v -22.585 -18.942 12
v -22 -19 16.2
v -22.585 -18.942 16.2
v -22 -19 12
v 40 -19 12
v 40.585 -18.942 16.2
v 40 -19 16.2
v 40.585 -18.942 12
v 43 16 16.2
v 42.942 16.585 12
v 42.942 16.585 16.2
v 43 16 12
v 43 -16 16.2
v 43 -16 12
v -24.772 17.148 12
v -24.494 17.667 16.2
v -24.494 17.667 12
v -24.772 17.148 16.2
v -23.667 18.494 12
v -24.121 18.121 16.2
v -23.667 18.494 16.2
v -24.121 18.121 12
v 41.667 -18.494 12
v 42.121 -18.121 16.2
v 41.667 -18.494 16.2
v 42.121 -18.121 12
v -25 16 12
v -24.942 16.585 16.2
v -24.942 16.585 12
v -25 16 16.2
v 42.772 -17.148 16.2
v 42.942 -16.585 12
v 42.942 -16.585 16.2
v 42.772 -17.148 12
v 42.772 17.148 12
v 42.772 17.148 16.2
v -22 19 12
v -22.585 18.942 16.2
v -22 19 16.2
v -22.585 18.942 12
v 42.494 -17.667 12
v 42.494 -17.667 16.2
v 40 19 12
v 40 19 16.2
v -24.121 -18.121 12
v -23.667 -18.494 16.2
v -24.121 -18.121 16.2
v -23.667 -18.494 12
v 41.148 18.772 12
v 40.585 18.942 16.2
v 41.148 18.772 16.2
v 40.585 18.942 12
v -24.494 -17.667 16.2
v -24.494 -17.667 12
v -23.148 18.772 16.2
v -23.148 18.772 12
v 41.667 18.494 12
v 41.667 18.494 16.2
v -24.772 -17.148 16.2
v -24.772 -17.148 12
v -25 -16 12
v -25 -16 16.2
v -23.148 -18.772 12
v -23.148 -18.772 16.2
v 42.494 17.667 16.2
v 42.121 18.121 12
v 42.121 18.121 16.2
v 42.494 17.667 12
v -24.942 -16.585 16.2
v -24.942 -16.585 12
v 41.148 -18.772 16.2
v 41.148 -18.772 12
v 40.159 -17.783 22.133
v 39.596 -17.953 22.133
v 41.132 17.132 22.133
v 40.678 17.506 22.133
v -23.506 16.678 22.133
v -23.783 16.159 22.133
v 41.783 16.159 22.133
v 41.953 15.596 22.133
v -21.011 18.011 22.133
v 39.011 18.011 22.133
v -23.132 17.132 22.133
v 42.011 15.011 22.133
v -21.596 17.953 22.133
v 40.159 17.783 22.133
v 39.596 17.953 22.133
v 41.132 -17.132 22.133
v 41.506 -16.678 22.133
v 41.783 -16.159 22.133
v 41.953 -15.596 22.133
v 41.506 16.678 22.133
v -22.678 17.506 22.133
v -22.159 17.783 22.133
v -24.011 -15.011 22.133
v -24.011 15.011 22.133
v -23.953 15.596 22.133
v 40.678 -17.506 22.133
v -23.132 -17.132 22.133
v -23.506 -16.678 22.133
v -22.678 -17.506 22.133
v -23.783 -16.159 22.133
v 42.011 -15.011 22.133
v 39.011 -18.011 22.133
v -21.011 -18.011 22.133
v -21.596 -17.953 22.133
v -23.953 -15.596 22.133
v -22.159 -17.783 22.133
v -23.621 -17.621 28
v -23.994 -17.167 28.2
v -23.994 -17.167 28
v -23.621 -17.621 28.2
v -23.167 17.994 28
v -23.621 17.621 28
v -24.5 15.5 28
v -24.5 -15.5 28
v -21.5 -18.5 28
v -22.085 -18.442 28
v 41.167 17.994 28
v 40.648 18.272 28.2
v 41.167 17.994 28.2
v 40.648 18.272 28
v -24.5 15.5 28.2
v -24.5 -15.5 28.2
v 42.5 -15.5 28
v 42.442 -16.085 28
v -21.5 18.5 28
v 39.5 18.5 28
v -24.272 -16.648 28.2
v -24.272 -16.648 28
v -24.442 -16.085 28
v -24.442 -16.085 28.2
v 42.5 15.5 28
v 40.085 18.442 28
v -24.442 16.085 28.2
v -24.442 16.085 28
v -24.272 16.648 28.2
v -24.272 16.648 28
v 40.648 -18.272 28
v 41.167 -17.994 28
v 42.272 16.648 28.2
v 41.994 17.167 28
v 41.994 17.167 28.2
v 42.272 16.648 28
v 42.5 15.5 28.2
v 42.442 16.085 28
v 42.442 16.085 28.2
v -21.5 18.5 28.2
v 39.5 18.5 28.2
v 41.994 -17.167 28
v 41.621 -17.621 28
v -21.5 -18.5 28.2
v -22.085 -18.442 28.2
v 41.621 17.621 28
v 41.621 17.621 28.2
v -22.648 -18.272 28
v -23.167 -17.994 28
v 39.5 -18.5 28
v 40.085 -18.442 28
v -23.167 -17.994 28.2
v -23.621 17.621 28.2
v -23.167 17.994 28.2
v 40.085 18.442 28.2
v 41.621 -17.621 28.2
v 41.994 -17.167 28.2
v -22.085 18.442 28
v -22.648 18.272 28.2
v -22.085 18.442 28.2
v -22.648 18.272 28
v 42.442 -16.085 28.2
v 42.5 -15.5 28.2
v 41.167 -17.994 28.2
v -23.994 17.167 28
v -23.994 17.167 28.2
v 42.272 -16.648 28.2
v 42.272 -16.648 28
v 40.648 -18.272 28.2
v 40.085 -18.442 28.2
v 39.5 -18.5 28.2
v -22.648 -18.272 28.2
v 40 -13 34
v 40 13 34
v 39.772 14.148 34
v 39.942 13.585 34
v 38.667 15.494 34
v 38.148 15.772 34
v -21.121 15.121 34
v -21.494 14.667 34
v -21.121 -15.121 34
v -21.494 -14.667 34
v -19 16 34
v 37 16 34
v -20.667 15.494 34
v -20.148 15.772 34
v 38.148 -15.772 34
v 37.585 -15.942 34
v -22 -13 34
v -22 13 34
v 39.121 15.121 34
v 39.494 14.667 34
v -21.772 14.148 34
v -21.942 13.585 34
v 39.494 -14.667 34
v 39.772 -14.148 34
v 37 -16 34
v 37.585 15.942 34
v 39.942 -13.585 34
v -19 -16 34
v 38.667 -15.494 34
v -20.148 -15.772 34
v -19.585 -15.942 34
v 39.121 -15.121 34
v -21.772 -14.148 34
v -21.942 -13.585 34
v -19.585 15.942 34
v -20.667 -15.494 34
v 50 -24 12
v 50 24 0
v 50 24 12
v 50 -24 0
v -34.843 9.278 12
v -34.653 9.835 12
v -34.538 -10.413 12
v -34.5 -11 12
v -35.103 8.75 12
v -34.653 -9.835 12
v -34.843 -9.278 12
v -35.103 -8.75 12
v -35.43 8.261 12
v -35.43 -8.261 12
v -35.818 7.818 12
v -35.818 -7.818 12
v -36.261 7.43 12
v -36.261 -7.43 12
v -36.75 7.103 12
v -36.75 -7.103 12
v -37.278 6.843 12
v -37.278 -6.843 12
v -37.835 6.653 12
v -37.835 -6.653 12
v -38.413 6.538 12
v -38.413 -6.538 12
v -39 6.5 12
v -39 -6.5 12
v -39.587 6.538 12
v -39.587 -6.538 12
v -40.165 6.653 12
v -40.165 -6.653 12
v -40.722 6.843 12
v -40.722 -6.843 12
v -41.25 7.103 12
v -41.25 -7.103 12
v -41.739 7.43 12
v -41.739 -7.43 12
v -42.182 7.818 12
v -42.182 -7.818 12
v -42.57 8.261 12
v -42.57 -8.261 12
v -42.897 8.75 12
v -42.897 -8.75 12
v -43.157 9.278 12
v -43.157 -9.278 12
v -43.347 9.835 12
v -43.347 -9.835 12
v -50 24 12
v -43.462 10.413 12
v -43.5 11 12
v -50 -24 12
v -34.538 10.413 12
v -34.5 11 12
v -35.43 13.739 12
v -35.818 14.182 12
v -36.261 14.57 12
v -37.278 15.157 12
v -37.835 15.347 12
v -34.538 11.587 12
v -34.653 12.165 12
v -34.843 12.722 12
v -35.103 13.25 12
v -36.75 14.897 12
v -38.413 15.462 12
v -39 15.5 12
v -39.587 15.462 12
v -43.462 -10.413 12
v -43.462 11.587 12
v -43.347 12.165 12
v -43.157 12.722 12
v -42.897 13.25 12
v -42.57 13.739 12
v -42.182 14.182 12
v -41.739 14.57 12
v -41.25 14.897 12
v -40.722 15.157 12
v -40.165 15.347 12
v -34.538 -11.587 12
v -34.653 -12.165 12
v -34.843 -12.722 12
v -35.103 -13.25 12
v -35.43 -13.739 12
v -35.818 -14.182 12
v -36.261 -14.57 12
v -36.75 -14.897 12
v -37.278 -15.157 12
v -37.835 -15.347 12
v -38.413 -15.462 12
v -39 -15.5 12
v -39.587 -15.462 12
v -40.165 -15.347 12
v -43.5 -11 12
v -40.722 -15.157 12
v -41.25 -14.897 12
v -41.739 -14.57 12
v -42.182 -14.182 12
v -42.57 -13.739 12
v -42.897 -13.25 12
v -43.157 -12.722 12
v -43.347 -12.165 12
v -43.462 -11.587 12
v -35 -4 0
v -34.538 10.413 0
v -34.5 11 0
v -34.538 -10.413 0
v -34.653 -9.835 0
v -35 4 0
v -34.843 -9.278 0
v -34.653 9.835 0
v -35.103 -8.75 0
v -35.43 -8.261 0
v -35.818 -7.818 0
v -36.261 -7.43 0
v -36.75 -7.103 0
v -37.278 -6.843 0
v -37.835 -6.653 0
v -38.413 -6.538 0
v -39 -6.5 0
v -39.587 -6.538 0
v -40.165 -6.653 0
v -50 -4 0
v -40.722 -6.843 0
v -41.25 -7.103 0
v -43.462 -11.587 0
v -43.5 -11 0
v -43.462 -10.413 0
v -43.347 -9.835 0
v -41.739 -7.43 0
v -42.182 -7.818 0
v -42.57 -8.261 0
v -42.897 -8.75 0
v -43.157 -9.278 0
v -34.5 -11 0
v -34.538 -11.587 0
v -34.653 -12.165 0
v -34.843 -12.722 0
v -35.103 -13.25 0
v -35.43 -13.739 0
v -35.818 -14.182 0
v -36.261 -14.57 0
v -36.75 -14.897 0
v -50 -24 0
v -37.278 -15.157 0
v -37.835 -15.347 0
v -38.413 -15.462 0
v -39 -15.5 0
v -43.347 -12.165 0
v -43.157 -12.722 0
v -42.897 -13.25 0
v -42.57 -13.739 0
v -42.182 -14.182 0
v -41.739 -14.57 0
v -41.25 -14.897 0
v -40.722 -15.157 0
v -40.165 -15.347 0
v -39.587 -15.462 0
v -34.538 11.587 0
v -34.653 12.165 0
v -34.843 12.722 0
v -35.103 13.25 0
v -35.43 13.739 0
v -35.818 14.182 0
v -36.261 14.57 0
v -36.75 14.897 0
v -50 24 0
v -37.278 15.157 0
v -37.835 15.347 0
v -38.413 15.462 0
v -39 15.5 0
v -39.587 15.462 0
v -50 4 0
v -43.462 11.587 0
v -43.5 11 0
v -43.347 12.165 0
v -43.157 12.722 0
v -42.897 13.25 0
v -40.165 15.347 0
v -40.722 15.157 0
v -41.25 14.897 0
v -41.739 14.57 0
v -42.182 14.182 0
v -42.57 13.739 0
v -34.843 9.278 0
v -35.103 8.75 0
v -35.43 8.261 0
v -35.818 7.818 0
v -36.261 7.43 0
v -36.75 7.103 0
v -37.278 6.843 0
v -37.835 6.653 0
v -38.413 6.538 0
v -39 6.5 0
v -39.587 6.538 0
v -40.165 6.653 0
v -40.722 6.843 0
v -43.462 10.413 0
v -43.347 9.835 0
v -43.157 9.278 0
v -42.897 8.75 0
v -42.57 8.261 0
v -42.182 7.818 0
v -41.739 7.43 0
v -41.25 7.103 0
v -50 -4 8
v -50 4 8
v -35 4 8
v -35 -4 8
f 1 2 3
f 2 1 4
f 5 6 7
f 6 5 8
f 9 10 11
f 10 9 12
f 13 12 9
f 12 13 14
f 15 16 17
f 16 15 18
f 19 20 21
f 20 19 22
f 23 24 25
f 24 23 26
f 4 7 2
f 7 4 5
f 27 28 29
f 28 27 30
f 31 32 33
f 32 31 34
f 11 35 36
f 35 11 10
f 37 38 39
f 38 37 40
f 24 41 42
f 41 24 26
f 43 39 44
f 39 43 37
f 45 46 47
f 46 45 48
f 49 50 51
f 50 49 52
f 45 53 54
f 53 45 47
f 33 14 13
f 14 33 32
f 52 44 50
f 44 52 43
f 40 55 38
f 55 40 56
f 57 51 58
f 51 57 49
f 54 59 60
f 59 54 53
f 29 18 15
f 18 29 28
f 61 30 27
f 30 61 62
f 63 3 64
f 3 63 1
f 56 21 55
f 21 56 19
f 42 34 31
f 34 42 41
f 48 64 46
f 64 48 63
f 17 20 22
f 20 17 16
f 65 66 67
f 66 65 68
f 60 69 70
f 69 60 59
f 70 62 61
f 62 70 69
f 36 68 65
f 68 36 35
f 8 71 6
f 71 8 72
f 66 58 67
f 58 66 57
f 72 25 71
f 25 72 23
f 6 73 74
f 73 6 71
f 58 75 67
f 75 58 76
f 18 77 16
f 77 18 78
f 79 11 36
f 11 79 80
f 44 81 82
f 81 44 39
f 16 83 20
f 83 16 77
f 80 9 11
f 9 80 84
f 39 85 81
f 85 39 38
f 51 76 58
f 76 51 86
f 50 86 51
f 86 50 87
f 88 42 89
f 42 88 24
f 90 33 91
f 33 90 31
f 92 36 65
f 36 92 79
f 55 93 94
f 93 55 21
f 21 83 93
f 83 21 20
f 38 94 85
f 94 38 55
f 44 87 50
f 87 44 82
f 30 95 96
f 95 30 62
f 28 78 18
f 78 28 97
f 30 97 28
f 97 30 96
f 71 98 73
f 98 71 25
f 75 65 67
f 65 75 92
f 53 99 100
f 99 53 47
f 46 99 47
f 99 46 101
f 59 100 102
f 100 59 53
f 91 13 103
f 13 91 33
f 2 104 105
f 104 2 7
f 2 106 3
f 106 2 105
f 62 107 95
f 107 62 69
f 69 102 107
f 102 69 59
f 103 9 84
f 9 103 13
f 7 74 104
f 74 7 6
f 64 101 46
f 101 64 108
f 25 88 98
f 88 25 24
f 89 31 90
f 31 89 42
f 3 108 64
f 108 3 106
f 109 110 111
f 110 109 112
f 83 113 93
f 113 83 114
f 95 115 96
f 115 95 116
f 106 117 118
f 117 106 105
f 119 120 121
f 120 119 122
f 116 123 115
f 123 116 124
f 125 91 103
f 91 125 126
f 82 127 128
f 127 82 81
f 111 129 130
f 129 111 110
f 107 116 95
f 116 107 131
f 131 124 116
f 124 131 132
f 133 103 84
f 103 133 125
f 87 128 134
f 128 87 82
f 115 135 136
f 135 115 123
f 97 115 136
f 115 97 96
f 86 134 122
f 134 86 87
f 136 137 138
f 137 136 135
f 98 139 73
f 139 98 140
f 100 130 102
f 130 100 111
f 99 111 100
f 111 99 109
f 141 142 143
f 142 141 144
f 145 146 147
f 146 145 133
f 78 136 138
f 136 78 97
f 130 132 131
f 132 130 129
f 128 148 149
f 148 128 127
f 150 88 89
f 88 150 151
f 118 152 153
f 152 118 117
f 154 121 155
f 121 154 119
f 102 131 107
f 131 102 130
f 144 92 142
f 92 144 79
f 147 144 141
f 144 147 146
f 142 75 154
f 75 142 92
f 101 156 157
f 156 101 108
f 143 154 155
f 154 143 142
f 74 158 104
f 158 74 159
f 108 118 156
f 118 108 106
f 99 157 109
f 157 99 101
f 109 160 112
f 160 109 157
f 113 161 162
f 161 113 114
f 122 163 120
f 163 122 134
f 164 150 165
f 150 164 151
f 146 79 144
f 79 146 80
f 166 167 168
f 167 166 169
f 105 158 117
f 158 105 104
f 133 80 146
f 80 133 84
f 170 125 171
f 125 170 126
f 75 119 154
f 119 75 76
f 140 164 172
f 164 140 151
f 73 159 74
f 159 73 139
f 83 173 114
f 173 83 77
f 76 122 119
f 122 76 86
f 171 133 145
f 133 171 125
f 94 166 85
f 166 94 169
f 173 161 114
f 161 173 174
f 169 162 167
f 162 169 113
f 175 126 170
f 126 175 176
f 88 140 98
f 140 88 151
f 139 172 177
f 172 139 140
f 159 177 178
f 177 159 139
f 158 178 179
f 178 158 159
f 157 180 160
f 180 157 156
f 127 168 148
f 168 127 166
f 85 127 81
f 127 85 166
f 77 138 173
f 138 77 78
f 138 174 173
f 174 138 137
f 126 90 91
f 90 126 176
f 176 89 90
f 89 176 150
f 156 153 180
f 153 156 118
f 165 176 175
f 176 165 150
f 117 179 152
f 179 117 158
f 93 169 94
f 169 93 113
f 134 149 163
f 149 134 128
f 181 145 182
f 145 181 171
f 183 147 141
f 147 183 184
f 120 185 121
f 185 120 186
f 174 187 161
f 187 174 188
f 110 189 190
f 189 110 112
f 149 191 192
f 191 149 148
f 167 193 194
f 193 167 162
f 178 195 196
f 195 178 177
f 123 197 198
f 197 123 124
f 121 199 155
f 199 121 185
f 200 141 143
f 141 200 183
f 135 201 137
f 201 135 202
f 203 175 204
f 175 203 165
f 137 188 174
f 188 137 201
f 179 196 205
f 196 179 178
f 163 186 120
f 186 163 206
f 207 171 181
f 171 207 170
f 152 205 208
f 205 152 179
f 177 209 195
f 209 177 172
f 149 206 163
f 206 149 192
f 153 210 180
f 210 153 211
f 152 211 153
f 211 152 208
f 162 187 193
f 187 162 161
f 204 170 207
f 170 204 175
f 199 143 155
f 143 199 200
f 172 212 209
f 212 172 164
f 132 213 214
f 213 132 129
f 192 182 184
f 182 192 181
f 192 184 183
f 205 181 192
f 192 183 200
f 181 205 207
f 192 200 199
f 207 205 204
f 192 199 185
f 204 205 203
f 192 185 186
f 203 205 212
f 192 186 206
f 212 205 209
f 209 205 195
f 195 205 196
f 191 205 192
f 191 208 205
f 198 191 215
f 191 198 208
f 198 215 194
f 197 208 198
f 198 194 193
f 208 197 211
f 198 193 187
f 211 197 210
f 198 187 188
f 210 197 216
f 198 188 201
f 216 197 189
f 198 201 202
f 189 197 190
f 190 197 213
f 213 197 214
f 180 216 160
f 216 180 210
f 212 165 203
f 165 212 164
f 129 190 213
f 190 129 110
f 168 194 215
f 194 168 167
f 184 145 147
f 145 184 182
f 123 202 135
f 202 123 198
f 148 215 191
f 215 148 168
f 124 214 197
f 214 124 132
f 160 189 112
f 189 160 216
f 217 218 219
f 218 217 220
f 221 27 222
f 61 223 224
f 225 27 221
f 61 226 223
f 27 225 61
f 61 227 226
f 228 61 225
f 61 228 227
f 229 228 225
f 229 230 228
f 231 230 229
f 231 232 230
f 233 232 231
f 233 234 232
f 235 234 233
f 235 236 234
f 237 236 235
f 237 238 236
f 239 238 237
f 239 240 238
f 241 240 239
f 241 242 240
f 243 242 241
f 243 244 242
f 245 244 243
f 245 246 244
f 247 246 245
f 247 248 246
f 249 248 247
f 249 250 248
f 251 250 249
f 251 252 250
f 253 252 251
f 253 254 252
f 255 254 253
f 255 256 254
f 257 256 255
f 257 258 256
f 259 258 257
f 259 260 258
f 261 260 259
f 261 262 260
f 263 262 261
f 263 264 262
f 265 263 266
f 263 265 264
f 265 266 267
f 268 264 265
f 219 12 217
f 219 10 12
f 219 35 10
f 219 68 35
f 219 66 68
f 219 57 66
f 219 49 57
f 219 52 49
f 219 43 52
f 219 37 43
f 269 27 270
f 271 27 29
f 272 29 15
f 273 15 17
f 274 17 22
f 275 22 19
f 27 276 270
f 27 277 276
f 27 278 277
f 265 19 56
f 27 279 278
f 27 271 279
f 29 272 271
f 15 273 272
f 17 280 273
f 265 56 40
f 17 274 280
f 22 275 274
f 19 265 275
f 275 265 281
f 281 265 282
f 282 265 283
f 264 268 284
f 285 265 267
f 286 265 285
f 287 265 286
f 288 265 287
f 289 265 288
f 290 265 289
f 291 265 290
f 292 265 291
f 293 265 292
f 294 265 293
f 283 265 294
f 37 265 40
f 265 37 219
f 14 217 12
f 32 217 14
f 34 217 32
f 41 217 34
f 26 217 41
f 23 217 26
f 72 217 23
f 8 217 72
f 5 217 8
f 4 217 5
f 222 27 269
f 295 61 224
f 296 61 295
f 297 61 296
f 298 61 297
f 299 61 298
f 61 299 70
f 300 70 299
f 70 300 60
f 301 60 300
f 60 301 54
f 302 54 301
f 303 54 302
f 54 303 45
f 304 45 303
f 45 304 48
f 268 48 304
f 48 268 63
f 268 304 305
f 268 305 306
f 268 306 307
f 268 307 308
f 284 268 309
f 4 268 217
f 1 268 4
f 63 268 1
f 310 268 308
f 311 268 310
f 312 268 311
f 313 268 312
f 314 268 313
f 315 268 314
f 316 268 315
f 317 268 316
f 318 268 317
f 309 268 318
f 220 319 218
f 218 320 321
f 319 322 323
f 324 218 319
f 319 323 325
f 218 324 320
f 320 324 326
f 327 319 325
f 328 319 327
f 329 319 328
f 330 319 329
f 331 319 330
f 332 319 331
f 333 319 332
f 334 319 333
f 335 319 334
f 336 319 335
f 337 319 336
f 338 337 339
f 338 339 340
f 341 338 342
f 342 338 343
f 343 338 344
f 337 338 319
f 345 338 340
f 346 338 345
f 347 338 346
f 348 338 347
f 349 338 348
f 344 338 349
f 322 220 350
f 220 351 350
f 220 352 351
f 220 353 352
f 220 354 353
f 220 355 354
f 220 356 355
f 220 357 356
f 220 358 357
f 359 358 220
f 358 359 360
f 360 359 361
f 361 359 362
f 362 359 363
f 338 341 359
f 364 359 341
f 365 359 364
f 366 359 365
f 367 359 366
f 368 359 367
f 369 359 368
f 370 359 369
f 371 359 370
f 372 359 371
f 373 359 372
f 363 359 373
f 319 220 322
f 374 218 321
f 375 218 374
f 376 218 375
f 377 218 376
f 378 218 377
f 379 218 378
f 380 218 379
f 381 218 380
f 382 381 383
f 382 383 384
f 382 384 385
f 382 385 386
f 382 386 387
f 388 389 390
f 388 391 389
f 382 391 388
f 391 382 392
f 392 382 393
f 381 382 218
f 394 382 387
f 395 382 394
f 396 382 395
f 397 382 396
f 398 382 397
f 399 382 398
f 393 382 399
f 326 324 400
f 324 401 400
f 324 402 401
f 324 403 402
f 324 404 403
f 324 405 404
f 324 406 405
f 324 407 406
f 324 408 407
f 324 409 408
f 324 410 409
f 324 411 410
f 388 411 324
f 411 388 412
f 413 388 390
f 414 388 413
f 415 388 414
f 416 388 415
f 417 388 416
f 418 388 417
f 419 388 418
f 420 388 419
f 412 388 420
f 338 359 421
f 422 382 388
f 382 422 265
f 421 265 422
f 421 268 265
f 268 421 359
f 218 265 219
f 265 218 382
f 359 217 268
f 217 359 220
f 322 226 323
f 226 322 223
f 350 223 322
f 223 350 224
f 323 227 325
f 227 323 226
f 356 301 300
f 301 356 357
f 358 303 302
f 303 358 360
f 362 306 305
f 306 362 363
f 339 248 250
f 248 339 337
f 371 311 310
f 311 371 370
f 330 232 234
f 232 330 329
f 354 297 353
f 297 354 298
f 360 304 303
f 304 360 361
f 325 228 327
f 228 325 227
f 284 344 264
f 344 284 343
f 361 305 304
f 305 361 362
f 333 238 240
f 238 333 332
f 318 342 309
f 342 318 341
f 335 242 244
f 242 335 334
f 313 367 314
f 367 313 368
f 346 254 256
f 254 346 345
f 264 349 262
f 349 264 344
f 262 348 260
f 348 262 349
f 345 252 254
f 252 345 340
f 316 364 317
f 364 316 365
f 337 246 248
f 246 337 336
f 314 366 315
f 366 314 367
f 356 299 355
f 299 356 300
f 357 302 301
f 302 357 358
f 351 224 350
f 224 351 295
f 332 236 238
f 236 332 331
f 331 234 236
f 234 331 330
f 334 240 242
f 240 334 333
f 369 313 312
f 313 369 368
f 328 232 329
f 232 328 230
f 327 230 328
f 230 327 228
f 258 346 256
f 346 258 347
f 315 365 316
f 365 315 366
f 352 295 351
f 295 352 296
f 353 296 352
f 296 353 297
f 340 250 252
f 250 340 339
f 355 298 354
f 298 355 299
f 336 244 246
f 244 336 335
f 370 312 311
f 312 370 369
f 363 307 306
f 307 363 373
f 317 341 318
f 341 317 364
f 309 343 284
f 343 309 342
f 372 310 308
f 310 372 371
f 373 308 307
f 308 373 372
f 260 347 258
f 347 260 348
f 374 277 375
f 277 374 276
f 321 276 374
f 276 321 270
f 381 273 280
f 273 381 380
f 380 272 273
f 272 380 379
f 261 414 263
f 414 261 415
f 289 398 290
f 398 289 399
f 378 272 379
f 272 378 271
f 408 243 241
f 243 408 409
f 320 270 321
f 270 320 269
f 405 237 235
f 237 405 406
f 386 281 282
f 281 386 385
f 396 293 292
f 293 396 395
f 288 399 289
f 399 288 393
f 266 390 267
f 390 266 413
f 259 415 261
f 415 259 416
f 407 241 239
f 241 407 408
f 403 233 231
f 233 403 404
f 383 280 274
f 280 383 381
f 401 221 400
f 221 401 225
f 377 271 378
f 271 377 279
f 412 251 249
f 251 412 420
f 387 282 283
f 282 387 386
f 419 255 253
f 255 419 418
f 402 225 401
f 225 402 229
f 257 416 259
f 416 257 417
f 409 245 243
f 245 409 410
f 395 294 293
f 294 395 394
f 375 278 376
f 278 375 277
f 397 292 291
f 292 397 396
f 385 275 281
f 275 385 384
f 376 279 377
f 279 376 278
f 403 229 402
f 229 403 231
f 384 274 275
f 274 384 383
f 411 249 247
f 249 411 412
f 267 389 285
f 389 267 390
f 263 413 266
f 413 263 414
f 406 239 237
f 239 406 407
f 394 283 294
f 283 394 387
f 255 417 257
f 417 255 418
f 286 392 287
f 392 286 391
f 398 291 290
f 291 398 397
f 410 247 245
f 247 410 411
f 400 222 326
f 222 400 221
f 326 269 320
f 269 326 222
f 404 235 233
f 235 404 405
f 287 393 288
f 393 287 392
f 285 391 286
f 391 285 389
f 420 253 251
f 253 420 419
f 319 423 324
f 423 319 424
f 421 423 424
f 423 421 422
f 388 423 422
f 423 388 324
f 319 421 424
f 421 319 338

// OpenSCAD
// Editable exterior of the sample part. Units are millimetres.
outer_rounding = 3;
side_bend = 1;
top_taper = 3;

mount_height = 12;
body_height = 34;

module mount_solid() {
    translate([-50, -24, 0]) cube([100, 48, mount_height]);
}

module mating_voids() {
    for (y = [-11, 11])
        translate([-39, y, -1]) cylinder(h = mount_height + 2, r = 4.5, $fn = 48);
    translate([-51, -4, -1]) cube([16, 8, 9]);
}

module section(z, inset, radius) {
    translate([9, 0, z])
        hull()
            for (x = [-1, 1], y = [-1, 1])
                translate([x * (34 - inset - radius), y * (19 - inset - radius), 0])
                    cylinder(h = 0.2, r = radius, $fn = 32);
}

module exterior() {
    levels = [mount_height - 0.4, mount_height + 4, 22, 28, body_height - 0.2];
    insets = [0, 0, side_bend, side_bend * 0.5, top_taper];
    for (i = [0:3])
        hull() {
            section(levels[i], insets[i], outer_rounding);
            section(levels[i + 1], insets[i + 1], outer_rounding);
        }
}

difference() {
    union() {
        mount_solid();
        exterior();
    }
    mating_voids();
}
